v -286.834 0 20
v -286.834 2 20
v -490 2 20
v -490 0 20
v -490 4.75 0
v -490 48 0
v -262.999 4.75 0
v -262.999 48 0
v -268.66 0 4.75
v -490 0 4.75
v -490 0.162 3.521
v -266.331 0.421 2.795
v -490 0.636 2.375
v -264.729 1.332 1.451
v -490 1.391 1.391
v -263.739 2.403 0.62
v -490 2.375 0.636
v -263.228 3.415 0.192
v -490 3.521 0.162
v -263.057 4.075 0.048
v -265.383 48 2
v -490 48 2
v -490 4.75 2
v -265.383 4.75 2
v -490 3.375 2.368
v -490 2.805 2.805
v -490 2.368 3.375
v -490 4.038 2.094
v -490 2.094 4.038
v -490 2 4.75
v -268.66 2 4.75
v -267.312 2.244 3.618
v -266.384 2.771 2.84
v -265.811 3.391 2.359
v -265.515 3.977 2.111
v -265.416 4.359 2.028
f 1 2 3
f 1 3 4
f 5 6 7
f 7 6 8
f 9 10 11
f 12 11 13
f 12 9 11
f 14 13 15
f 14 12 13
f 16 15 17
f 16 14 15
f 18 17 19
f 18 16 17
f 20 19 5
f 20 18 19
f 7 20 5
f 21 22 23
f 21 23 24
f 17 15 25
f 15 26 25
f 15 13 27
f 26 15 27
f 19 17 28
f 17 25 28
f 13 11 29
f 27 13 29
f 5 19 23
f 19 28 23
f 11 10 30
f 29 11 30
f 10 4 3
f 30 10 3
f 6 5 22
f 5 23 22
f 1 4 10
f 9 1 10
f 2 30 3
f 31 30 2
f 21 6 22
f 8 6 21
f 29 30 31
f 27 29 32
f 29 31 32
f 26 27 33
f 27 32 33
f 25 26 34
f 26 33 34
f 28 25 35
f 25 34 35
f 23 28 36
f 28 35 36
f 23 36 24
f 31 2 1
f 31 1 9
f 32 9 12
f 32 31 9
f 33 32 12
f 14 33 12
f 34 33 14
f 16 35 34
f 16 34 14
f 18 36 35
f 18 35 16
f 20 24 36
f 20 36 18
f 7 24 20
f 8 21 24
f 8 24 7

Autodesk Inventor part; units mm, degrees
ref_plane "YZ Plane" through (0, 0, 0) normal (1, 0, 0) x (0, 1, 0)
ref_plane "XZ Plane" through (0, 0, 0) normal (0, 1, 0) x (-1, 0, 0)
ref_plane "XY Plane" through (0, 0, 0) normal (0, 0, 1) x (1, 0, 0)
sketch "Sketch1" plane through (0, 0, 0) normal (0, 0, 1) x (1, 0, 0)
  line L0 (-490, 48) -> (490, 48)
  line L1 (490, 48) -> (490, 0)
  line L2 (490, 0) -> (-490, 0)
  line L3 (-490, 0) -> (-490, 48)
  point P0 (0, 0)
  point P1 (0, 0)
  dimension "d0" = 980
  dimension "d1" = 48
extrude "Plate1" add sketch "Sketch1" along normal blind 2
sketch "Sketch2" plane through (490, 2, 0) normal (0, -1, 0) x (1, 0, 0)
  line L0 (-980, 0) -> (0, 0)
  line L1 (0, 0) -> (0, 20)
  line L2 (0, 20) -> (-980, 20)
  line L3 (-980, 20) -> (-980, 0)
edge flange "Flange1" height 20 angle 90 thickness 2 bend radius 2.75 thickness toward (0, -1, 0) relief round relief width 2 relief depth 1 edges at (0, 0, 2) wall of the first edge with corners at (-490, 2, 0) (490, 2, 0) (490, 2, 20) (-490, 2, 20)
bend "Bend1"
corner "Corner1"
sketch "Sketch5" plane through (0, 0, 0) normal (0, 0, -1) x (-1, 0, 0)
  line L0 (490, 48) -> (-490, 48) projected
  line L1 (490, 0) -> (-490, 0) projected
  circle A0 centre (0, 48) radius 35
  line L2 (243.95, 48) -> (246.05, 48)
  line L3 (246.05, 48) -> (246.05, 27)
  line L4 (246.05, 27) -> (243.95, 27)
  line L5 (243.95, 27) -> (243.95, 48)
  line L6 (-243.95, 48) -> (-246.05, 48)
  line L7 (-246.05, 48) -> (-246.05, 27)
  line L8 (-246.05, 27) -> (-243.95, 27)
  line L9 (-243.95, 27) -> (-243.95, 48)
  line L10 (0, 48) -> (0, 0) construction
  line L11 (490, 0) -> (490, 48)
  line L12 (-490, 0) -> (-490, 48)
  circle A1 centre (-490, 48) radius 35
  circle A2 centre (490, 48) radius 35
  point P0 (0, 0)
  point P1 (245, 27)
  point P2 (-245, 27)
  point P3 (246.05, 48)
  point P4 (-35, 48)
  point P5 (35, 48)
  point P6 (-246.05, 48)
  point P7 (455, 48)
  point P8 (490, 13)
  point P9 (-490, 13)
  point P10 (-455, 48)
  dimension "d45" = 70
  dimension "d48" = 2.1
  dimension "d49" = 490
  dimension "d51" = 27
  dimension "d52" = 21
extrude "Extrusion1" cut sketch "Sketch5" against normal through all contours L3 L4 L5 L0 | L9 L8 L7 L0
sketch "Sketch9" plane through (0, 0, 2) normal (0, 0, 1) x (1, 0, 0)
  line L0 (-266.5915, 24.3045) -> (-266.5915, 12.3045) construction
  line L1 (-266.5915, 12.3045) -> (-466.5915, 12.3045) construction
  line L2 (-466.5915, 12.3045) -> (-466.5915, 24.3045) construction
  line L3 (-466.5915, 24.3045) -> (-266.5915, 24.3045) construction
  line L4 (-490, 48) -> (490, 48) projected
  point P0 (0, 0)
  point P1 (1.05, 68)
  point P2 (490, 48)
  dimension "d40" = 200
  dimension "d41" = 12
mark "Mark2"
sketch "Sketch10" plane through (-490, 0, 20) normal (0, -1, 0) x (1, 0, 0)
  line L0 (980, -20) -> (0, -20) projected
  line L1 (0, 0) -> (980, 0) projected
  line L2 (980, -20) -> (203.1655, -20)
  line L3 (203.1655, -20) -> (203.1655, 0)
  line L4 (203.1655, 0) -> (980, 0)
  line L5 (980, 0) -> (980, -20)
  line L6 (203.1655, 0) -> (227.0006, -20)
  point P0 (490, -20)
  dimension "d53" = 776.8345
  dimension "d54" = 50
extrude "Extrusion4" cut sketch "Sketch10" along normal through all both and the other way through all contours L0 L6 L1 L5
equation "\"d2\" = Thickness"
equation "\"d3\" = BendReliefWidth"
equation "\"d4\" = BendReliefDepth"
equation "\"d5\" = MinimumRemnant"
equation "\"d6\" = TransitionRadius"
equation "\"d9\" = BendRadius"
equation "\"d10\" = CornerReliefSize"
equation "\"d11\" = GapSize"
equation "\"d12\" = JacobiRadiusSize"
equation "\"BendReliefWidth\" = Thickness"
equation "\"BendReliefDepth\" = 0.5 * Thickness"
equation "\"CornerReliefSize\" = 4 * Thickness"
equation "\"MinimumRemnant\" = 2 * Thickness"
equation "\"TransitionRadius\" = BendRadius"
equation "\"JacobiRadiusSize\" = BendRadius"
equation "\"GapSize\" = Thickness"
equation "\"Thickness\" = 2"
equation "\"BendRadius\" = 2.75"
properties part number "MSC 327 STRINGER BOARD  ##" material "Stainless Steel"
